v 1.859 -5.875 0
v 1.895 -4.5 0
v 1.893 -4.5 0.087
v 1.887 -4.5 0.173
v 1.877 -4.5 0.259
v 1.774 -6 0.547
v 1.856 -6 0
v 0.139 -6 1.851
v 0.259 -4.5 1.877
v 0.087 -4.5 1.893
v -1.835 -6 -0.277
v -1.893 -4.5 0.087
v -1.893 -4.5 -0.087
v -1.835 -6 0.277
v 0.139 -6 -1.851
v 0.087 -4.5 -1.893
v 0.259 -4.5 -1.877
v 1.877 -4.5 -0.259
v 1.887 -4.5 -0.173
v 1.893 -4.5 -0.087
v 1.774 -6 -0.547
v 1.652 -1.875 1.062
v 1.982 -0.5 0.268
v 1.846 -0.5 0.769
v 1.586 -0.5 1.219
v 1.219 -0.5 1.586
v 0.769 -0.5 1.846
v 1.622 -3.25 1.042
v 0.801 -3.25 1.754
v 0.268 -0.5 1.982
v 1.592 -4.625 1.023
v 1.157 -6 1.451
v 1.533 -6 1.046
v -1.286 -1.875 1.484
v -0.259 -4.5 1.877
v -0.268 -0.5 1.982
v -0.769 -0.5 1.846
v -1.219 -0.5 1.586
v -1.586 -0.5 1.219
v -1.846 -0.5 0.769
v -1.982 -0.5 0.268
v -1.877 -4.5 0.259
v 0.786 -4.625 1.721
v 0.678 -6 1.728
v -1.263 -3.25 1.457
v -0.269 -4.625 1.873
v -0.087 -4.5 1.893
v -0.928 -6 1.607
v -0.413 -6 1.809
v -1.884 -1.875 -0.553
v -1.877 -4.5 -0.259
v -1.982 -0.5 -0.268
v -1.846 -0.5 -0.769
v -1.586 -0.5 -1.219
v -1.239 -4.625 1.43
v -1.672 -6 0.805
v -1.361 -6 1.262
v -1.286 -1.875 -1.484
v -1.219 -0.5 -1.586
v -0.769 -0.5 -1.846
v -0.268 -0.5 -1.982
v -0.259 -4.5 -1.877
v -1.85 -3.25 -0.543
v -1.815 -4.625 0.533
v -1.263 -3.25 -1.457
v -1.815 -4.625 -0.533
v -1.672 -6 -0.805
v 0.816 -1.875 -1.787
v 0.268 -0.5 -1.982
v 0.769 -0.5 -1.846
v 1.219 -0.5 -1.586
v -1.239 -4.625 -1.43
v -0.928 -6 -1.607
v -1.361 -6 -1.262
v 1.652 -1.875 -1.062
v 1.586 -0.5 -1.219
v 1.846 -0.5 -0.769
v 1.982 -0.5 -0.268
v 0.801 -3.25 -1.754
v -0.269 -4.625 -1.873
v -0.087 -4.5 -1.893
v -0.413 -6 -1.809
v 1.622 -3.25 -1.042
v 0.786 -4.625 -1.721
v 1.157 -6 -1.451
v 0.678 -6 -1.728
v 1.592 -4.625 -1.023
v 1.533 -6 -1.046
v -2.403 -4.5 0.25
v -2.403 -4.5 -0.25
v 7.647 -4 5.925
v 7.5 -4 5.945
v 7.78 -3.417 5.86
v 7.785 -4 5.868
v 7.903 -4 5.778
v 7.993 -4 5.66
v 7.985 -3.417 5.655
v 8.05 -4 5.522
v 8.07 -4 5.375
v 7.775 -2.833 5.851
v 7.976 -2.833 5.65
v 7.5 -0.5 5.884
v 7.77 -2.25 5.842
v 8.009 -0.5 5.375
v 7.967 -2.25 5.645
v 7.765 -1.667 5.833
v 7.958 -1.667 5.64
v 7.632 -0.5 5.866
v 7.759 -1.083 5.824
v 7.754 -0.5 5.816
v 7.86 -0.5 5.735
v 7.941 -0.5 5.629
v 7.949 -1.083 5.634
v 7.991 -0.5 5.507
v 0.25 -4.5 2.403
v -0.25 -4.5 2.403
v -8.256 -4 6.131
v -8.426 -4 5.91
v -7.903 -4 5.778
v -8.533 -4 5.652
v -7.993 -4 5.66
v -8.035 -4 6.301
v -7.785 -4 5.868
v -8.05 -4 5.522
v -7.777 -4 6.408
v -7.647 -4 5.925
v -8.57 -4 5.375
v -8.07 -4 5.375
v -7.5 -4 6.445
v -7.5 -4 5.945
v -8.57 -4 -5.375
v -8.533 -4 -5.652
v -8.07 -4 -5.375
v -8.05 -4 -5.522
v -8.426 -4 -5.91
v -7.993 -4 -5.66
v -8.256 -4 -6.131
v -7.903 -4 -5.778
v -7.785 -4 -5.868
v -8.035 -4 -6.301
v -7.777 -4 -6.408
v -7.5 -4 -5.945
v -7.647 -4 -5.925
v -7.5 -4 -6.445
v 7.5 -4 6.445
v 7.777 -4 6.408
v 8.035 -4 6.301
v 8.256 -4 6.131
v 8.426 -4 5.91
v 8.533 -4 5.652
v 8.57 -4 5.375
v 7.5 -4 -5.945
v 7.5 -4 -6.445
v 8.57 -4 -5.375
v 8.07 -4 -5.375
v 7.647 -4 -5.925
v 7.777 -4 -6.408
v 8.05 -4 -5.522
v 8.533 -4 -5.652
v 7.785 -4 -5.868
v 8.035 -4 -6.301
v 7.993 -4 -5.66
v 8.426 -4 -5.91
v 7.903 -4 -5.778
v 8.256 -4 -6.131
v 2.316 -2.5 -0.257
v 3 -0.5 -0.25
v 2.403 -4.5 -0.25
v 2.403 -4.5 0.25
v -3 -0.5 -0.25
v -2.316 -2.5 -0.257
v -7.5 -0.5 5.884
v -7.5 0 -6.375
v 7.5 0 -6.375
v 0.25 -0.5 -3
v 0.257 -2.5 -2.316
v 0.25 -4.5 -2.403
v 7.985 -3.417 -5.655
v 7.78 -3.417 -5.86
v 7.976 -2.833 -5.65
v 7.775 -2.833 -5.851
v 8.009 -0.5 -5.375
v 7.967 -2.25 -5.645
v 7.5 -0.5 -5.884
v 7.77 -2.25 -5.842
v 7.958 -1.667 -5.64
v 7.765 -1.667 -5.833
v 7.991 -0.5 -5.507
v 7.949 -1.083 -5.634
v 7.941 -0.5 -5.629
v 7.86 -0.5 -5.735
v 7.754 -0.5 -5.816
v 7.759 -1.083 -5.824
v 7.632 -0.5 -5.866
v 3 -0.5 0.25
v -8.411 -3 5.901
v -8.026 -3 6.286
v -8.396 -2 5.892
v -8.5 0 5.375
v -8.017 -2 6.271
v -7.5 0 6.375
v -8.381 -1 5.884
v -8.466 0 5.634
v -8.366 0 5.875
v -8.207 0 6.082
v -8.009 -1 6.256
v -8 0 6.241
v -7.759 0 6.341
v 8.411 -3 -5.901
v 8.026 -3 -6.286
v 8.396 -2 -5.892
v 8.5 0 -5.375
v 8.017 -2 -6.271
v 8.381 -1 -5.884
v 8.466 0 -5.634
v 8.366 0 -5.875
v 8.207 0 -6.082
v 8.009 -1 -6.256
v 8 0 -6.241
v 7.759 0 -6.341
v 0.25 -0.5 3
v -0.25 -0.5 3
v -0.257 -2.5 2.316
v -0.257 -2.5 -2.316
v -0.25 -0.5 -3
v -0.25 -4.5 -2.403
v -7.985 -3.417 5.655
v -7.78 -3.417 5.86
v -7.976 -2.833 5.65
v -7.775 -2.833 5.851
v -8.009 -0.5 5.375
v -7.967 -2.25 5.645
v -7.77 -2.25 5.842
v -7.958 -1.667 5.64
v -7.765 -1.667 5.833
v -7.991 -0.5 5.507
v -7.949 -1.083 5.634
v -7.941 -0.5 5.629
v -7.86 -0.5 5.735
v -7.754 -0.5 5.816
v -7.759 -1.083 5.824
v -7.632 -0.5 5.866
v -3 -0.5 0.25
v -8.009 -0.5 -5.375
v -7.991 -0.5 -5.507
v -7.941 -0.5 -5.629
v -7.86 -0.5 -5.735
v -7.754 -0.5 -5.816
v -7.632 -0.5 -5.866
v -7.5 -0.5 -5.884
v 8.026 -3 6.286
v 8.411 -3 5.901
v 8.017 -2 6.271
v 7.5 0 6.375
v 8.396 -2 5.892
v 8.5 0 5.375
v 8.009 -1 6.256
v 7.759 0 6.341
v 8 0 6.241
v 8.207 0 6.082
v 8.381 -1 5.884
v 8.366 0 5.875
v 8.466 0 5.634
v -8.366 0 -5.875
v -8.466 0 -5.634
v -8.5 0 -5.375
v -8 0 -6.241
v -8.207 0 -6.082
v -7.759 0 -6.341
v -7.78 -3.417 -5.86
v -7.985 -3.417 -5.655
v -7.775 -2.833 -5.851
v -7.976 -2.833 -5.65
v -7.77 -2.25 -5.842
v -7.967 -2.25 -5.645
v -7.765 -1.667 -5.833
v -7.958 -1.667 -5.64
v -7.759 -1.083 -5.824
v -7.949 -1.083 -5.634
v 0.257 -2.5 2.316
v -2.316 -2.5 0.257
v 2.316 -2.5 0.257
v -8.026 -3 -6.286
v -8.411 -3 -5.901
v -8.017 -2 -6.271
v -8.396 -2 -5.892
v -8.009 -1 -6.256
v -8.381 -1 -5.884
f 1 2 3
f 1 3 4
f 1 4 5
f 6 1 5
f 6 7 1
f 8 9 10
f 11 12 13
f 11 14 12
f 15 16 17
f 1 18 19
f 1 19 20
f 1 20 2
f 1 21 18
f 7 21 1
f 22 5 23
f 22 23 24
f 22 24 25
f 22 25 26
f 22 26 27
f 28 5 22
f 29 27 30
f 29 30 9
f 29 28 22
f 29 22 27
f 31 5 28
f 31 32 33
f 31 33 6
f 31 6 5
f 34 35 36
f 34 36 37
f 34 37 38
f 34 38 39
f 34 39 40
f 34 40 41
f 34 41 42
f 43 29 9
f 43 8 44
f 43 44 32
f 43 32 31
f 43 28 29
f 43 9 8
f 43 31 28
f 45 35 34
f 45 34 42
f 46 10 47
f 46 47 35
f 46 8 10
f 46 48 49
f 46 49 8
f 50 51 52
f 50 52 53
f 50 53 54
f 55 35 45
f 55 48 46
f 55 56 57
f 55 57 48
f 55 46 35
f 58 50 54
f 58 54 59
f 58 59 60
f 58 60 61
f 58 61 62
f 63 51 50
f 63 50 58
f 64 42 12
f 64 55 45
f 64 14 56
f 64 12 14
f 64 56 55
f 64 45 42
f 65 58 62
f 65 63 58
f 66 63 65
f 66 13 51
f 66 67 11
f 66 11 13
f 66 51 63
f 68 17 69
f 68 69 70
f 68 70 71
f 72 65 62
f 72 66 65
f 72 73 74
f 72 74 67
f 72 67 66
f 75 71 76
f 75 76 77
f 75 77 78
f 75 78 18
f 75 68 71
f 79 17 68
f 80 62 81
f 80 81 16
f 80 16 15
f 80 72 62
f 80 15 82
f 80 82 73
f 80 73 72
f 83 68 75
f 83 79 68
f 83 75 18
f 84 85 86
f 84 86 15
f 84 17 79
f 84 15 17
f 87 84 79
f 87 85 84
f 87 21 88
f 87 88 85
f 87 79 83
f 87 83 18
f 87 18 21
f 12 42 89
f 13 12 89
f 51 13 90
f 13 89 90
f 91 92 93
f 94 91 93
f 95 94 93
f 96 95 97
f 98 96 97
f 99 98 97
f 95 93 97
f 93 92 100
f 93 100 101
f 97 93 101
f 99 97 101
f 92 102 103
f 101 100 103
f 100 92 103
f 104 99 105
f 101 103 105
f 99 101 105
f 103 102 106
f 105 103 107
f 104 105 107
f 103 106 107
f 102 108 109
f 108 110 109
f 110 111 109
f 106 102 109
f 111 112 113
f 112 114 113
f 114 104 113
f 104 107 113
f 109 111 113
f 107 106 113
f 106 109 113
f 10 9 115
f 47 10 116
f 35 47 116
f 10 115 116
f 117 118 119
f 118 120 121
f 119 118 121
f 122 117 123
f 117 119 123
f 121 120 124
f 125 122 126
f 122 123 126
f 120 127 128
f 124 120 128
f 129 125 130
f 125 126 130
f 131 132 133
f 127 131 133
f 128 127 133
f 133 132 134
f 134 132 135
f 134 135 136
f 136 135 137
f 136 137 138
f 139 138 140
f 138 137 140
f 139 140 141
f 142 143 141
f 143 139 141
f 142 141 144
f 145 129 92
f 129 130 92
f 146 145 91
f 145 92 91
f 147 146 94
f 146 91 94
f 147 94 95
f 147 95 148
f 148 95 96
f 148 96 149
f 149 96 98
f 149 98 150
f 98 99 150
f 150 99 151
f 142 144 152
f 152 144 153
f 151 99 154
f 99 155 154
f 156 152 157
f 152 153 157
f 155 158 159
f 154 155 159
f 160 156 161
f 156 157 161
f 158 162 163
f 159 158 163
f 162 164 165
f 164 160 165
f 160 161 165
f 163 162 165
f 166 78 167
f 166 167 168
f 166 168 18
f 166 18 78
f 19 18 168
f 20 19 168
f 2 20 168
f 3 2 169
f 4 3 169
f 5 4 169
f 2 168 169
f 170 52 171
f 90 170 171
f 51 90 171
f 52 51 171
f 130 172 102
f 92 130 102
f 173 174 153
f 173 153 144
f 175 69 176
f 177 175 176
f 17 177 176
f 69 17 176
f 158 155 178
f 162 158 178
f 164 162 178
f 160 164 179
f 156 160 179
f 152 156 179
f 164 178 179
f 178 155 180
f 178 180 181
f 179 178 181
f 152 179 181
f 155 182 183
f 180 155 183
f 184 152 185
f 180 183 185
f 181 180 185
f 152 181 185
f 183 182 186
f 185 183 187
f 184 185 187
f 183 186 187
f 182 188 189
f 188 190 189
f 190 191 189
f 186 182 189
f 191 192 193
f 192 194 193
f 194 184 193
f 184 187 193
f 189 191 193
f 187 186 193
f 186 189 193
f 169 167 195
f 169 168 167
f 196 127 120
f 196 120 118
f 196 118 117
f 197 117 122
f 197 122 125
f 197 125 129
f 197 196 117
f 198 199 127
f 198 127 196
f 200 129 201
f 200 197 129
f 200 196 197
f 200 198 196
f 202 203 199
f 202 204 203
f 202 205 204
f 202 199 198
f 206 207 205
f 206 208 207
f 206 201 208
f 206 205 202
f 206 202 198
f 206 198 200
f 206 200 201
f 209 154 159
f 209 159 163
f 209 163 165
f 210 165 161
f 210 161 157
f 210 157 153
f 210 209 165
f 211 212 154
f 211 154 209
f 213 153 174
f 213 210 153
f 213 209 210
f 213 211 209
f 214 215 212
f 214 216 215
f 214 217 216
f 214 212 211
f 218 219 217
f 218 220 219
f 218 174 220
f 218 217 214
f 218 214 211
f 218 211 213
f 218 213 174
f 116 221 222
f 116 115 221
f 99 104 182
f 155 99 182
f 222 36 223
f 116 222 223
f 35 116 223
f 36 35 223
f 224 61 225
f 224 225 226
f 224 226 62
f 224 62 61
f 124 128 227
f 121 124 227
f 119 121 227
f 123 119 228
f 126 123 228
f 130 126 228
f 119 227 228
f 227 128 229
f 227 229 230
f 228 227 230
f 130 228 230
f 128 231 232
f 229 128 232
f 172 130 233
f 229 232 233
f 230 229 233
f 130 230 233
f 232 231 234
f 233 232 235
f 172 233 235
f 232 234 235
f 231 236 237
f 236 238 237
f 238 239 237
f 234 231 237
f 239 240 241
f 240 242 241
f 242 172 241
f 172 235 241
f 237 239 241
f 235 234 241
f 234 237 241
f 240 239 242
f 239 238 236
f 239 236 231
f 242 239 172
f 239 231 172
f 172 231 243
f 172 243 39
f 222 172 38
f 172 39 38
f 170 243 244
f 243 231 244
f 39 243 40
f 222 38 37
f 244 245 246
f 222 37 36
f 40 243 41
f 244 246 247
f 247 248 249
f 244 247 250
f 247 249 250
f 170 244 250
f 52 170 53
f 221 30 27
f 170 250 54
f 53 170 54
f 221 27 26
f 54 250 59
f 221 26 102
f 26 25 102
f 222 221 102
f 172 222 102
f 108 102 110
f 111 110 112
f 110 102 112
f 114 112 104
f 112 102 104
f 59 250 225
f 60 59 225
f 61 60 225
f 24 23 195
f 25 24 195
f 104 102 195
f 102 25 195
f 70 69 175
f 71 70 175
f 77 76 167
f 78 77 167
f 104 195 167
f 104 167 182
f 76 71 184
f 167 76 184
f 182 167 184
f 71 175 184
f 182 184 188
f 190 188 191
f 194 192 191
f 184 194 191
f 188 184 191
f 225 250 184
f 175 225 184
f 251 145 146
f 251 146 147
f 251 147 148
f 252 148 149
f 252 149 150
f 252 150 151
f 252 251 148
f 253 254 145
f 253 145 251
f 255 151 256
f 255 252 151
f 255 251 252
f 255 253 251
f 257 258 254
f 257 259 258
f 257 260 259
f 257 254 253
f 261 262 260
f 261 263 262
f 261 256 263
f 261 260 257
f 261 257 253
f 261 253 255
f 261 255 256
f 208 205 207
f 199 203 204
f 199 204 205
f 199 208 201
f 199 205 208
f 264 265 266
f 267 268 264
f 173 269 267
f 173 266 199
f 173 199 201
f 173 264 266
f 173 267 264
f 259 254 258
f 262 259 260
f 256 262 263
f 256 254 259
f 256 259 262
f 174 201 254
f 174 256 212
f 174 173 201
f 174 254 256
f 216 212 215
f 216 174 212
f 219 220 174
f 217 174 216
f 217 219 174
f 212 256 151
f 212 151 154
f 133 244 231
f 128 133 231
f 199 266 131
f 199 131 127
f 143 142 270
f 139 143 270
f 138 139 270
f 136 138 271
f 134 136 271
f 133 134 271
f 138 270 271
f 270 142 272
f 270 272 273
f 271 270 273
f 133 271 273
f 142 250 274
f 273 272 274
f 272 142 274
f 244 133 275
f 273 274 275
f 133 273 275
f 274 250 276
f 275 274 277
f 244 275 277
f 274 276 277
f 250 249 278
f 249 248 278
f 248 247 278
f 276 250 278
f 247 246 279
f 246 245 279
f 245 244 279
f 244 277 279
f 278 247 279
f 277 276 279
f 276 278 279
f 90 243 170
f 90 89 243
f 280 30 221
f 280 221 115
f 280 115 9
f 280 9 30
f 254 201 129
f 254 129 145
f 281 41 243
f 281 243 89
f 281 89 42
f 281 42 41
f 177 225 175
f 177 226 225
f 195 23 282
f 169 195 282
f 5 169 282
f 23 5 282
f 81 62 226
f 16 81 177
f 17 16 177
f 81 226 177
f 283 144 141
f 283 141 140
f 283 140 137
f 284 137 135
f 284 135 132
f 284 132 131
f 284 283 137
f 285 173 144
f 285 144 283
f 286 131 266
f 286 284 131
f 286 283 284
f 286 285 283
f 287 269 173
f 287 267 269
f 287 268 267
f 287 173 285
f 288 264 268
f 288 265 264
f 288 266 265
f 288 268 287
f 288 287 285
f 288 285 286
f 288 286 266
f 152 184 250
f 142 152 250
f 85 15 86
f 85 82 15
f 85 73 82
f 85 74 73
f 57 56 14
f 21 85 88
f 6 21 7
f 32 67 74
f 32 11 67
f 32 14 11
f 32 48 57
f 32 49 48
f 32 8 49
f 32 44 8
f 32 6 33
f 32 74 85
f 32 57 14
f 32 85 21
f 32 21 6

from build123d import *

# Parameters (mm, degrees)
BOSS_EXTRUDE1_DEPTH = 4
BOSS_EXTRUDE1_DRAFT = 1
SHELL1_T            = -0.5
SKETCH2_R           = 2
BOSS_EXTRUDE2_DEPTH = 5.5
BOSS_EXTRUDE2_TAPER = 1.5
CIRPATTERN1_COUNT   = 4


with BuildPart() as part:
    # Sketch1 → Boss-Extrude1 (with draft: the straight prism first)
    with BuildSketch(Plane(origin=(0, 0, 0), x_dir=(1, 0, 0), z_dir=(0, 1, 0))):
        with BuildLine():
            Line((-7.5, -6.375), (7.5, -6.375))
            ThreePointArc((7.5, -6.375), (8.207106781, -6.082106781), (8.5, -5.375))
            Line((8.5, -5.375), (8.5, 5.375))
            ThreePointArc((8.5, 5.375), (8.207106781, 6.082106781), (7.5, 6.375))
            Line((7.5, 6.375), (-7.5, 6.375))
            ThreePointArc((-7.5, 6.375), (-8.207106781, 6.082106781), (-8.5, 5.375))
            Line((-8.5, 5.375), (-8.5, -5.375))
            ThreePointArc((-8.5, -5.375), (-8.207106781, -6.082106781), (-7.5, -6.375))
        make_face()
    extrude(amount=-BOSS_EXTRUDE1_DEPTH)
    # Boss-Extrude1: the draft: its side faces are tilted about the plane it starts from
    boss_extrude1_sides = [part.faces().sort_by_distance(p)[0] for p in [
        (0, -2, 6.375),
        (8.207106781, -2, 6.082106781),
        (8.5, -2, 0),
        (8.207106781, -2, -6.082106781),
        (0, -2, -6.375),
        (-8.207106781, -2, -6.082106781),
        (-8.5, -2, 0),
        (-8.207106781, -2, 6.082106781),
    ]]
    draft(boss_extrude1_sides, Plane(origin=(0, 0, 0), x_dir=(1, 0, 0), z_dir=(0, 1, 0)), BOSS_EXTRUDE1_DRAFT)

    # Shell1
    shell1_openings = [part.faces().sort_by_distance(p)[0] for p in [
        (0, -4, 0),
    ]]
    offset(amount=SHELL1_T, openings=shell1_openings, kind=Kind.INTERSECTION)

    # Sketch2 → Boss-Extrude2 (add)
    with BuildSketch(Plane.XZ.offset(0.5)):
        Circle(SKETCH2_R)
    extrude(amount=BOSS_EXTRUDE2_DEPTH, taper=BOSS_EXTRUDE2_TAPER)

    # Rib1: read off the stored shape, not the designer's step
    # Rib1: loft between two sections, ruled curve by curve
    rib1_from = [
        Edge.make_line((1.982020214, -0.5, 0.267574046), (3, -0.5, 0.25)),
        Edge.make_line((1.982020214, -0.5, -0.267574046), (3, -0.5, -0.25)),
        Edge.make_line((3, -0.5, -0.25), (3, -0.5, 0.25)),
        Edge.make_line((1.982020214, -0.5, -0.267574046), (1.982020214, -0.5, 0.267574046)),
    ]
    rib1_to = [
        Edge.make_line((1.877466543, -4.5, 0.259067318), (2.402692557, -4.5, 0.25)),
        Edge.make_line((1.877466543, -4.5, -0.259067318), (2.402692557, -4.5, -0.25)),
        Edge.make_line((2.402692557, -4.5, -0.25), (2.402692557, -4.5, 0.25)),
        Edge.make_line((1.877466543, -4.5, -0.259067318), (1.877466543, -4.5, 0.259067318)),
    ]
    rib1 = Solid(Shell([*[Face.make_surface_from_curves(rib1_from[k], rib1_to[k]) for k in range(4)], Face(Wire(rib1_from)), Face(Wire(rib1_to))]))
    add(rib1)

    # CirPattern1: Rib1 ×4 about axis
    cirpattern1_axis = Axis((0, 0, 0), (0, 1, 0))
    for i in range(1, CIRPATTERN1_COUNT):
        add(rib1.rotate(cirpattern1_axis, i * 360 / CIRPATTERN1_COUNT))


solid = part.part
